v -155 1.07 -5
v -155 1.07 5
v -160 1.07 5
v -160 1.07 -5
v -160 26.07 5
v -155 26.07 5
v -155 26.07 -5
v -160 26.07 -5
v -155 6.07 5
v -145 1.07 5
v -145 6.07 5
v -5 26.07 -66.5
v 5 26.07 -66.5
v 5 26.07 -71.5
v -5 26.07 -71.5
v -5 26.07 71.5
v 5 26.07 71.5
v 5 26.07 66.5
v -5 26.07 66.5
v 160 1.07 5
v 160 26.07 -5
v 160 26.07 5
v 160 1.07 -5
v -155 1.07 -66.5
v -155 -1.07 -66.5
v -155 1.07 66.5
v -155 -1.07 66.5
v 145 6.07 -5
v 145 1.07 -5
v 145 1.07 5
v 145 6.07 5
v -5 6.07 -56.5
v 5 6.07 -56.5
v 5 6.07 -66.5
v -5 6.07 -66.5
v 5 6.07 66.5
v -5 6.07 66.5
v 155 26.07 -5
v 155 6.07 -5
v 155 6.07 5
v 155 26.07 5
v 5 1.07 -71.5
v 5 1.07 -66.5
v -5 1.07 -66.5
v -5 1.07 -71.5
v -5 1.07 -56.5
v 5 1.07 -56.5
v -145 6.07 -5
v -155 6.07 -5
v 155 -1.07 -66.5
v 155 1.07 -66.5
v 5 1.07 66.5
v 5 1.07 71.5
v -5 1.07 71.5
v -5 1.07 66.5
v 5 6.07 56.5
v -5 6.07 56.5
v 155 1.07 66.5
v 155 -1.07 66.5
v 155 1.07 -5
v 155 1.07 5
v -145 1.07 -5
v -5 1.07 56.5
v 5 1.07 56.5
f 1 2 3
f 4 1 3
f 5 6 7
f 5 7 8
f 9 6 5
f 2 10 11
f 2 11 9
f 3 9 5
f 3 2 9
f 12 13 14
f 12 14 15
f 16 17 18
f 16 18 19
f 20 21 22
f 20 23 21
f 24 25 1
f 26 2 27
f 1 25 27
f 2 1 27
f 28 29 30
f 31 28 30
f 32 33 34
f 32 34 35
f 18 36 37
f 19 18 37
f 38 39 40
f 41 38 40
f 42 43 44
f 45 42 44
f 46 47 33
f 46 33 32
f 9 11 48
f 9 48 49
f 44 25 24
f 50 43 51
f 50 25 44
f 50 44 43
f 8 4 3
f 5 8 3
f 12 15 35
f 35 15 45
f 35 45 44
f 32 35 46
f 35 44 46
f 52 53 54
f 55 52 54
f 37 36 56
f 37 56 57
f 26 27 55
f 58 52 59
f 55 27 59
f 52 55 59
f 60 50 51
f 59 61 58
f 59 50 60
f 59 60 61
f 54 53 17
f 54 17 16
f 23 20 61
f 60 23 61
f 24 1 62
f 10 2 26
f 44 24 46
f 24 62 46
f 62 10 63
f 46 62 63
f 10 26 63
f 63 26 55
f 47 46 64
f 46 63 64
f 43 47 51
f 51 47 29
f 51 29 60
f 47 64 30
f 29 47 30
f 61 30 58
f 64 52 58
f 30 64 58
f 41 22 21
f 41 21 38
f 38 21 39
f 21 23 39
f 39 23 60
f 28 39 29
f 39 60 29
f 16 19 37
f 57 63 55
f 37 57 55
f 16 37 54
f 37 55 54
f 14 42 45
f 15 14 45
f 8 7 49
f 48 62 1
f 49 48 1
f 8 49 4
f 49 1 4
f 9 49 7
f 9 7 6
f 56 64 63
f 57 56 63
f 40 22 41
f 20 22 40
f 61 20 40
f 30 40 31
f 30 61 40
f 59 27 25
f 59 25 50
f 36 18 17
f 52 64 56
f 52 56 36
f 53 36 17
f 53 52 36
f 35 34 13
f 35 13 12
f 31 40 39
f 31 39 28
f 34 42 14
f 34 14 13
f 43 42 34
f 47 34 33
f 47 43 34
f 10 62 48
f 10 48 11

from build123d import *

# Parameters (mm, degrees)
F0_W     = 310
F0_H     = 133
F1_DEPTH = 1.07
F2_W     = 10
F2_H     = 15
F2_W_2   = 15
F2_H_2   = 10
F3_DEPTH = 5
F4_W     = 5
F4_H     = 10
F4_W_2   = 10
F4_H_2   = 5
F5_DEPTH = 20


with BuildPart() as f1:
    # F0 (on Front) → F1 (new body, symmetric)
    with BuildSketch(Plane.XZ):
        Rectangle(F0_W, F0_H)
    extrude(amount=F1_DEPTH, both=True)

    # F2 (on face) → F3 (join)
    with BuildSketch(Plane(origin=(0, 1.07, 0), x_dir=(-1, 0, 0), z_dir=(0, 1, 0))):
        with Locations((0, 64)):
            Rectangle(F2_W, F2_H)
        with Locations((-152.5, 0)):
            Rectangle(F2_W_2, F2_H_2)
        with Locations((0, -64)):
            Rectangle(F2_W, F2_H)
        with Locations((152.5, 0)):
            Rectangle(F2_W_2, F2_H_2)
    extrude(amount=F3_DEPTH)

    # F4 (on face) → F5 (join)
    with BuildSketch(Plane(origin=(0, 6.07, 0), x_dir=(-1, 0, 0), z_dir=(0, 1, 0))):
        with Locations((-157.5, 0)):
            Rectangle(F4_W, F4_H)
        with Locations((157.5, 0)):
            Rectangle(F4_W, F4_H)
        with Locations((0, 69)):
            Rectangle(F4_W_2, F4_H_2)
        with Locations((0, -69)):
            Rectangle(F4_W_2, F4_H_2)
    extrude(amount=F5_DEPTH)


solid = f1.part
